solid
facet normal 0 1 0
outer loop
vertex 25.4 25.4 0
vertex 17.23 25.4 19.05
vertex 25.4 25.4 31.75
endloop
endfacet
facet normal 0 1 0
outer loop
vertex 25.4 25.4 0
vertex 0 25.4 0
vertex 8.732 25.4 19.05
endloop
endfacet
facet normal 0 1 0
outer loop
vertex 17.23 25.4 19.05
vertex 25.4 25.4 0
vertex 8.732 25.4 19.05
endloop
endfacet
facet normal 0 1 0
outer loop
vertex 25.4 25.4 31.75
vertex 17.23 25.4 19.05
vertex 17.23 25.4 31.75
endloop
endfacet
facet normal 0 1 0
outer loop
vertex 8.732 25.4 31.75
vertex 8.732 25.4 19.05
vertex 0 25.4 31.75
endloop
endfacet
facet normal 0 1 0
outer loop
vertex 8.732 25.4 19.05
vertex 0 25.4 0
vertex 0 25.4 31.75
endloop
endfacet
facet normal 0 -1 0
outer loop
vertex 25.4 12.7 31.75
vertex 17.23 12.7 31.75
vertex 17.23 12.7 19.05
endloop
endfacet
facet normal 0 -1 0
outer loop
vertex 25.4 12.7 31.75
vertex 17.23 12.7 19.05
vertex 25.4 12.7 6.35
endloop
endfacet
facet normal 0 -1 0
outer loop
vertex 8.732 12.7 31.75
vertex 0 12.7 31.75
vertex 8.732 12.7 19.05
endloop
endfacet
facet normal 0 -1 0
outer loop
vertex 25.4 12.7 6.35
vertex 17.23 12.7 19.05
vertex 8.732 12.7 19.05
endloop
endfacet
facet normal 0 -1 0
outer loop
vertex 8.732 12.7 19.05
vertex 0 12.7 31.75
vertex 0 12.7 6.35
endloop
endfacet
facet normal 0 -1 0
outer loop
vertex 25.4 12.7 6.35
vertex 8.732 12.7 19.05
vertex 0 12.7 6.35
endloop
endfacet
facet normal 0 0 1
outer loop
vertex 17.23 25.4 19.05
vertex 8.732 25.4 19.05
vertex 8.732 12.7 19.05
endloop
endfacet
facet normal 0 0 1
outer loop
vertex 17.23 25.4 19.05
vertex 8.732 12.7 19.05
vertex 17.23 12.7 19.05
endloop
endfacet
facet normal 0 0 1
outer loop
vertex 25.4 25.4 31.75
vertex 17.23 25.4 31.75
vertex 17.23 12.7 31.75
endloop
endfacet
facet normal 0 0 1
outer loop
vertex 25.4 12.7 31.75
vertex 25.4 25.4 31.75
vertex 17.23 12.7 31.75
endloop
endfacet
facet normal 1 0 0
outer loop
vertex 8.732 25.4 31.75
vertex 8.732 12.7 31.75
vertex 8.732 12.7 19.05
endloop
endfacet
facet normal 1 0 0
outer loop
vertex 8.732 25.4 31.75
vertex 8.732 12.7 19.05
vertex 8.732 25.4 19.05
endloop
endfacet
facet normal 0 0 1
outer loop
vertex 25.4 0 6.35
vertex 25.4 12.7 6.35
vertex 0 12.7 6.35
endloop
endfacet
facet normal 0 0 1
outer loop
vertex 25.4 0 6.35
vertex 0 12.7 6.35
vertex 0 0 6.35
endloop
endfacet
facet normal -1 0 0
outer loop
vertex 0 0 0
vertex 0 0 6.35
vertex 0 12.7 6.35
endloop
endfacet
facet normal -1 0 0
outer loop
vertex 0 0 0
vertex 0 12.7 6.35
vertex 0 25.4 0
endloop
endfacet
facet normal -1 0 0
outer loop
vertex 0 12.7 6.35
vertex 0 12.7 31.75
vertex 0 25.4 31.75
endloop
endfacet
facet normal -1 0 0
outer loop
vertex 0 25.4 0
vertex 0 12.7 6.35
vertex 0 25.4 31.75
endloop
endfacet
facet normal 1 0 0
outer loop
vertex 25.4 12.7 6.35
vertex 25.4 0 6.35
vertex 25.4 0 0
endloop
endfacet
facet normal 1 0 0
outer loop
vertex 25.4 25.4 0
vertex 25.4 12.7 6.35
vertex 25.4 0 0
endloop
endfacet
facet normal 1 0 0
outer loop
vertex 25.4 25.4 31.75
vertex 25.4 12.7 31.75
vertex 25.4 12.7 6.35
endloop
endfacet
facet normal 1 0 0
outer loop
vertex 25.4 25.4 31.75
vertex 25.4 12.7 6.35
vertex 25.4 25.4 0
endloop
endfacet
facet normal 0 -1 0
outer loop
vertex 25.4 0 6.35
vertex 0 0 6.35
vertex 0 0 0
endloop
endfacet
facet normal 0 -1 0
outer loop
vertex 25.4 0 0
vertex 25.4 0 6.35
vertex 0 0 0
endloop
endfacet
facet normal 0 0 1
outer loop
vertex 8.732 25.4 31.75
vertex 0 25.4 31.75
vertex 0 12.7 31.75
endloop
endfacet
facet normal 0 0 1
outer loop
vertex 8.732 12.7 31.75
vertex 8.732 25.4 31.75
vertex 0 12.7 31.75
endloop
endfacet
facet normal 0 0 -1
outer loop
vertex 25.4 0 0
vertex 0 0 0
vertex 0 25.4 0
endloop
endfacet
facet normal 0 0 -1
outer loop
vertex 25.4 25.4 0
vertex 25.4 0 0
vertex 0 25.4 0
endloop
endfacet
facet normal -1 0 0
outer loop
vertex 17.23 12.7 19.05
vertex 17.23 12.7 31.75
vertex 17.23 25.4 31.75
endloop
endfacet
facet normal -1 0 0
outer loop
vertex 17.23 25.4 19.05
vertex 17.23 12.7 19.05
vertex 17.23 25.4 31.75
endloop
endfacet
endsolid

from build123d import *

# Parameters (mm, degrees)
F1_DEPTH = 25.4
F2_W     = 8.498132
F2_H     = 12.7
F3_DEPTH = 12.7


with BuildPart() as f1:
    # F0 (on Right) → F1 (new body)
    with BuildSketch(Plane.YZ):
        Polygon((0, 0), (25.4, 0), (25.4, 31.75), (12.7, 31.75), (12.7, 6.35), (0, 6.35), align=None)
    extrude(amount=F1_DEPTH)

    # F2 (on face) → F3 (cut, symmetric)
    with BuildSketch(Plane.XY.offset(31.75)):
        with Locations((12.980955, 19.05)):
            Rectangle(F2_W, F2_H)
    extrude(amount=F3_DEPTH, both=True, mode=Mode.SUBTRACT)


solid = f1.part
